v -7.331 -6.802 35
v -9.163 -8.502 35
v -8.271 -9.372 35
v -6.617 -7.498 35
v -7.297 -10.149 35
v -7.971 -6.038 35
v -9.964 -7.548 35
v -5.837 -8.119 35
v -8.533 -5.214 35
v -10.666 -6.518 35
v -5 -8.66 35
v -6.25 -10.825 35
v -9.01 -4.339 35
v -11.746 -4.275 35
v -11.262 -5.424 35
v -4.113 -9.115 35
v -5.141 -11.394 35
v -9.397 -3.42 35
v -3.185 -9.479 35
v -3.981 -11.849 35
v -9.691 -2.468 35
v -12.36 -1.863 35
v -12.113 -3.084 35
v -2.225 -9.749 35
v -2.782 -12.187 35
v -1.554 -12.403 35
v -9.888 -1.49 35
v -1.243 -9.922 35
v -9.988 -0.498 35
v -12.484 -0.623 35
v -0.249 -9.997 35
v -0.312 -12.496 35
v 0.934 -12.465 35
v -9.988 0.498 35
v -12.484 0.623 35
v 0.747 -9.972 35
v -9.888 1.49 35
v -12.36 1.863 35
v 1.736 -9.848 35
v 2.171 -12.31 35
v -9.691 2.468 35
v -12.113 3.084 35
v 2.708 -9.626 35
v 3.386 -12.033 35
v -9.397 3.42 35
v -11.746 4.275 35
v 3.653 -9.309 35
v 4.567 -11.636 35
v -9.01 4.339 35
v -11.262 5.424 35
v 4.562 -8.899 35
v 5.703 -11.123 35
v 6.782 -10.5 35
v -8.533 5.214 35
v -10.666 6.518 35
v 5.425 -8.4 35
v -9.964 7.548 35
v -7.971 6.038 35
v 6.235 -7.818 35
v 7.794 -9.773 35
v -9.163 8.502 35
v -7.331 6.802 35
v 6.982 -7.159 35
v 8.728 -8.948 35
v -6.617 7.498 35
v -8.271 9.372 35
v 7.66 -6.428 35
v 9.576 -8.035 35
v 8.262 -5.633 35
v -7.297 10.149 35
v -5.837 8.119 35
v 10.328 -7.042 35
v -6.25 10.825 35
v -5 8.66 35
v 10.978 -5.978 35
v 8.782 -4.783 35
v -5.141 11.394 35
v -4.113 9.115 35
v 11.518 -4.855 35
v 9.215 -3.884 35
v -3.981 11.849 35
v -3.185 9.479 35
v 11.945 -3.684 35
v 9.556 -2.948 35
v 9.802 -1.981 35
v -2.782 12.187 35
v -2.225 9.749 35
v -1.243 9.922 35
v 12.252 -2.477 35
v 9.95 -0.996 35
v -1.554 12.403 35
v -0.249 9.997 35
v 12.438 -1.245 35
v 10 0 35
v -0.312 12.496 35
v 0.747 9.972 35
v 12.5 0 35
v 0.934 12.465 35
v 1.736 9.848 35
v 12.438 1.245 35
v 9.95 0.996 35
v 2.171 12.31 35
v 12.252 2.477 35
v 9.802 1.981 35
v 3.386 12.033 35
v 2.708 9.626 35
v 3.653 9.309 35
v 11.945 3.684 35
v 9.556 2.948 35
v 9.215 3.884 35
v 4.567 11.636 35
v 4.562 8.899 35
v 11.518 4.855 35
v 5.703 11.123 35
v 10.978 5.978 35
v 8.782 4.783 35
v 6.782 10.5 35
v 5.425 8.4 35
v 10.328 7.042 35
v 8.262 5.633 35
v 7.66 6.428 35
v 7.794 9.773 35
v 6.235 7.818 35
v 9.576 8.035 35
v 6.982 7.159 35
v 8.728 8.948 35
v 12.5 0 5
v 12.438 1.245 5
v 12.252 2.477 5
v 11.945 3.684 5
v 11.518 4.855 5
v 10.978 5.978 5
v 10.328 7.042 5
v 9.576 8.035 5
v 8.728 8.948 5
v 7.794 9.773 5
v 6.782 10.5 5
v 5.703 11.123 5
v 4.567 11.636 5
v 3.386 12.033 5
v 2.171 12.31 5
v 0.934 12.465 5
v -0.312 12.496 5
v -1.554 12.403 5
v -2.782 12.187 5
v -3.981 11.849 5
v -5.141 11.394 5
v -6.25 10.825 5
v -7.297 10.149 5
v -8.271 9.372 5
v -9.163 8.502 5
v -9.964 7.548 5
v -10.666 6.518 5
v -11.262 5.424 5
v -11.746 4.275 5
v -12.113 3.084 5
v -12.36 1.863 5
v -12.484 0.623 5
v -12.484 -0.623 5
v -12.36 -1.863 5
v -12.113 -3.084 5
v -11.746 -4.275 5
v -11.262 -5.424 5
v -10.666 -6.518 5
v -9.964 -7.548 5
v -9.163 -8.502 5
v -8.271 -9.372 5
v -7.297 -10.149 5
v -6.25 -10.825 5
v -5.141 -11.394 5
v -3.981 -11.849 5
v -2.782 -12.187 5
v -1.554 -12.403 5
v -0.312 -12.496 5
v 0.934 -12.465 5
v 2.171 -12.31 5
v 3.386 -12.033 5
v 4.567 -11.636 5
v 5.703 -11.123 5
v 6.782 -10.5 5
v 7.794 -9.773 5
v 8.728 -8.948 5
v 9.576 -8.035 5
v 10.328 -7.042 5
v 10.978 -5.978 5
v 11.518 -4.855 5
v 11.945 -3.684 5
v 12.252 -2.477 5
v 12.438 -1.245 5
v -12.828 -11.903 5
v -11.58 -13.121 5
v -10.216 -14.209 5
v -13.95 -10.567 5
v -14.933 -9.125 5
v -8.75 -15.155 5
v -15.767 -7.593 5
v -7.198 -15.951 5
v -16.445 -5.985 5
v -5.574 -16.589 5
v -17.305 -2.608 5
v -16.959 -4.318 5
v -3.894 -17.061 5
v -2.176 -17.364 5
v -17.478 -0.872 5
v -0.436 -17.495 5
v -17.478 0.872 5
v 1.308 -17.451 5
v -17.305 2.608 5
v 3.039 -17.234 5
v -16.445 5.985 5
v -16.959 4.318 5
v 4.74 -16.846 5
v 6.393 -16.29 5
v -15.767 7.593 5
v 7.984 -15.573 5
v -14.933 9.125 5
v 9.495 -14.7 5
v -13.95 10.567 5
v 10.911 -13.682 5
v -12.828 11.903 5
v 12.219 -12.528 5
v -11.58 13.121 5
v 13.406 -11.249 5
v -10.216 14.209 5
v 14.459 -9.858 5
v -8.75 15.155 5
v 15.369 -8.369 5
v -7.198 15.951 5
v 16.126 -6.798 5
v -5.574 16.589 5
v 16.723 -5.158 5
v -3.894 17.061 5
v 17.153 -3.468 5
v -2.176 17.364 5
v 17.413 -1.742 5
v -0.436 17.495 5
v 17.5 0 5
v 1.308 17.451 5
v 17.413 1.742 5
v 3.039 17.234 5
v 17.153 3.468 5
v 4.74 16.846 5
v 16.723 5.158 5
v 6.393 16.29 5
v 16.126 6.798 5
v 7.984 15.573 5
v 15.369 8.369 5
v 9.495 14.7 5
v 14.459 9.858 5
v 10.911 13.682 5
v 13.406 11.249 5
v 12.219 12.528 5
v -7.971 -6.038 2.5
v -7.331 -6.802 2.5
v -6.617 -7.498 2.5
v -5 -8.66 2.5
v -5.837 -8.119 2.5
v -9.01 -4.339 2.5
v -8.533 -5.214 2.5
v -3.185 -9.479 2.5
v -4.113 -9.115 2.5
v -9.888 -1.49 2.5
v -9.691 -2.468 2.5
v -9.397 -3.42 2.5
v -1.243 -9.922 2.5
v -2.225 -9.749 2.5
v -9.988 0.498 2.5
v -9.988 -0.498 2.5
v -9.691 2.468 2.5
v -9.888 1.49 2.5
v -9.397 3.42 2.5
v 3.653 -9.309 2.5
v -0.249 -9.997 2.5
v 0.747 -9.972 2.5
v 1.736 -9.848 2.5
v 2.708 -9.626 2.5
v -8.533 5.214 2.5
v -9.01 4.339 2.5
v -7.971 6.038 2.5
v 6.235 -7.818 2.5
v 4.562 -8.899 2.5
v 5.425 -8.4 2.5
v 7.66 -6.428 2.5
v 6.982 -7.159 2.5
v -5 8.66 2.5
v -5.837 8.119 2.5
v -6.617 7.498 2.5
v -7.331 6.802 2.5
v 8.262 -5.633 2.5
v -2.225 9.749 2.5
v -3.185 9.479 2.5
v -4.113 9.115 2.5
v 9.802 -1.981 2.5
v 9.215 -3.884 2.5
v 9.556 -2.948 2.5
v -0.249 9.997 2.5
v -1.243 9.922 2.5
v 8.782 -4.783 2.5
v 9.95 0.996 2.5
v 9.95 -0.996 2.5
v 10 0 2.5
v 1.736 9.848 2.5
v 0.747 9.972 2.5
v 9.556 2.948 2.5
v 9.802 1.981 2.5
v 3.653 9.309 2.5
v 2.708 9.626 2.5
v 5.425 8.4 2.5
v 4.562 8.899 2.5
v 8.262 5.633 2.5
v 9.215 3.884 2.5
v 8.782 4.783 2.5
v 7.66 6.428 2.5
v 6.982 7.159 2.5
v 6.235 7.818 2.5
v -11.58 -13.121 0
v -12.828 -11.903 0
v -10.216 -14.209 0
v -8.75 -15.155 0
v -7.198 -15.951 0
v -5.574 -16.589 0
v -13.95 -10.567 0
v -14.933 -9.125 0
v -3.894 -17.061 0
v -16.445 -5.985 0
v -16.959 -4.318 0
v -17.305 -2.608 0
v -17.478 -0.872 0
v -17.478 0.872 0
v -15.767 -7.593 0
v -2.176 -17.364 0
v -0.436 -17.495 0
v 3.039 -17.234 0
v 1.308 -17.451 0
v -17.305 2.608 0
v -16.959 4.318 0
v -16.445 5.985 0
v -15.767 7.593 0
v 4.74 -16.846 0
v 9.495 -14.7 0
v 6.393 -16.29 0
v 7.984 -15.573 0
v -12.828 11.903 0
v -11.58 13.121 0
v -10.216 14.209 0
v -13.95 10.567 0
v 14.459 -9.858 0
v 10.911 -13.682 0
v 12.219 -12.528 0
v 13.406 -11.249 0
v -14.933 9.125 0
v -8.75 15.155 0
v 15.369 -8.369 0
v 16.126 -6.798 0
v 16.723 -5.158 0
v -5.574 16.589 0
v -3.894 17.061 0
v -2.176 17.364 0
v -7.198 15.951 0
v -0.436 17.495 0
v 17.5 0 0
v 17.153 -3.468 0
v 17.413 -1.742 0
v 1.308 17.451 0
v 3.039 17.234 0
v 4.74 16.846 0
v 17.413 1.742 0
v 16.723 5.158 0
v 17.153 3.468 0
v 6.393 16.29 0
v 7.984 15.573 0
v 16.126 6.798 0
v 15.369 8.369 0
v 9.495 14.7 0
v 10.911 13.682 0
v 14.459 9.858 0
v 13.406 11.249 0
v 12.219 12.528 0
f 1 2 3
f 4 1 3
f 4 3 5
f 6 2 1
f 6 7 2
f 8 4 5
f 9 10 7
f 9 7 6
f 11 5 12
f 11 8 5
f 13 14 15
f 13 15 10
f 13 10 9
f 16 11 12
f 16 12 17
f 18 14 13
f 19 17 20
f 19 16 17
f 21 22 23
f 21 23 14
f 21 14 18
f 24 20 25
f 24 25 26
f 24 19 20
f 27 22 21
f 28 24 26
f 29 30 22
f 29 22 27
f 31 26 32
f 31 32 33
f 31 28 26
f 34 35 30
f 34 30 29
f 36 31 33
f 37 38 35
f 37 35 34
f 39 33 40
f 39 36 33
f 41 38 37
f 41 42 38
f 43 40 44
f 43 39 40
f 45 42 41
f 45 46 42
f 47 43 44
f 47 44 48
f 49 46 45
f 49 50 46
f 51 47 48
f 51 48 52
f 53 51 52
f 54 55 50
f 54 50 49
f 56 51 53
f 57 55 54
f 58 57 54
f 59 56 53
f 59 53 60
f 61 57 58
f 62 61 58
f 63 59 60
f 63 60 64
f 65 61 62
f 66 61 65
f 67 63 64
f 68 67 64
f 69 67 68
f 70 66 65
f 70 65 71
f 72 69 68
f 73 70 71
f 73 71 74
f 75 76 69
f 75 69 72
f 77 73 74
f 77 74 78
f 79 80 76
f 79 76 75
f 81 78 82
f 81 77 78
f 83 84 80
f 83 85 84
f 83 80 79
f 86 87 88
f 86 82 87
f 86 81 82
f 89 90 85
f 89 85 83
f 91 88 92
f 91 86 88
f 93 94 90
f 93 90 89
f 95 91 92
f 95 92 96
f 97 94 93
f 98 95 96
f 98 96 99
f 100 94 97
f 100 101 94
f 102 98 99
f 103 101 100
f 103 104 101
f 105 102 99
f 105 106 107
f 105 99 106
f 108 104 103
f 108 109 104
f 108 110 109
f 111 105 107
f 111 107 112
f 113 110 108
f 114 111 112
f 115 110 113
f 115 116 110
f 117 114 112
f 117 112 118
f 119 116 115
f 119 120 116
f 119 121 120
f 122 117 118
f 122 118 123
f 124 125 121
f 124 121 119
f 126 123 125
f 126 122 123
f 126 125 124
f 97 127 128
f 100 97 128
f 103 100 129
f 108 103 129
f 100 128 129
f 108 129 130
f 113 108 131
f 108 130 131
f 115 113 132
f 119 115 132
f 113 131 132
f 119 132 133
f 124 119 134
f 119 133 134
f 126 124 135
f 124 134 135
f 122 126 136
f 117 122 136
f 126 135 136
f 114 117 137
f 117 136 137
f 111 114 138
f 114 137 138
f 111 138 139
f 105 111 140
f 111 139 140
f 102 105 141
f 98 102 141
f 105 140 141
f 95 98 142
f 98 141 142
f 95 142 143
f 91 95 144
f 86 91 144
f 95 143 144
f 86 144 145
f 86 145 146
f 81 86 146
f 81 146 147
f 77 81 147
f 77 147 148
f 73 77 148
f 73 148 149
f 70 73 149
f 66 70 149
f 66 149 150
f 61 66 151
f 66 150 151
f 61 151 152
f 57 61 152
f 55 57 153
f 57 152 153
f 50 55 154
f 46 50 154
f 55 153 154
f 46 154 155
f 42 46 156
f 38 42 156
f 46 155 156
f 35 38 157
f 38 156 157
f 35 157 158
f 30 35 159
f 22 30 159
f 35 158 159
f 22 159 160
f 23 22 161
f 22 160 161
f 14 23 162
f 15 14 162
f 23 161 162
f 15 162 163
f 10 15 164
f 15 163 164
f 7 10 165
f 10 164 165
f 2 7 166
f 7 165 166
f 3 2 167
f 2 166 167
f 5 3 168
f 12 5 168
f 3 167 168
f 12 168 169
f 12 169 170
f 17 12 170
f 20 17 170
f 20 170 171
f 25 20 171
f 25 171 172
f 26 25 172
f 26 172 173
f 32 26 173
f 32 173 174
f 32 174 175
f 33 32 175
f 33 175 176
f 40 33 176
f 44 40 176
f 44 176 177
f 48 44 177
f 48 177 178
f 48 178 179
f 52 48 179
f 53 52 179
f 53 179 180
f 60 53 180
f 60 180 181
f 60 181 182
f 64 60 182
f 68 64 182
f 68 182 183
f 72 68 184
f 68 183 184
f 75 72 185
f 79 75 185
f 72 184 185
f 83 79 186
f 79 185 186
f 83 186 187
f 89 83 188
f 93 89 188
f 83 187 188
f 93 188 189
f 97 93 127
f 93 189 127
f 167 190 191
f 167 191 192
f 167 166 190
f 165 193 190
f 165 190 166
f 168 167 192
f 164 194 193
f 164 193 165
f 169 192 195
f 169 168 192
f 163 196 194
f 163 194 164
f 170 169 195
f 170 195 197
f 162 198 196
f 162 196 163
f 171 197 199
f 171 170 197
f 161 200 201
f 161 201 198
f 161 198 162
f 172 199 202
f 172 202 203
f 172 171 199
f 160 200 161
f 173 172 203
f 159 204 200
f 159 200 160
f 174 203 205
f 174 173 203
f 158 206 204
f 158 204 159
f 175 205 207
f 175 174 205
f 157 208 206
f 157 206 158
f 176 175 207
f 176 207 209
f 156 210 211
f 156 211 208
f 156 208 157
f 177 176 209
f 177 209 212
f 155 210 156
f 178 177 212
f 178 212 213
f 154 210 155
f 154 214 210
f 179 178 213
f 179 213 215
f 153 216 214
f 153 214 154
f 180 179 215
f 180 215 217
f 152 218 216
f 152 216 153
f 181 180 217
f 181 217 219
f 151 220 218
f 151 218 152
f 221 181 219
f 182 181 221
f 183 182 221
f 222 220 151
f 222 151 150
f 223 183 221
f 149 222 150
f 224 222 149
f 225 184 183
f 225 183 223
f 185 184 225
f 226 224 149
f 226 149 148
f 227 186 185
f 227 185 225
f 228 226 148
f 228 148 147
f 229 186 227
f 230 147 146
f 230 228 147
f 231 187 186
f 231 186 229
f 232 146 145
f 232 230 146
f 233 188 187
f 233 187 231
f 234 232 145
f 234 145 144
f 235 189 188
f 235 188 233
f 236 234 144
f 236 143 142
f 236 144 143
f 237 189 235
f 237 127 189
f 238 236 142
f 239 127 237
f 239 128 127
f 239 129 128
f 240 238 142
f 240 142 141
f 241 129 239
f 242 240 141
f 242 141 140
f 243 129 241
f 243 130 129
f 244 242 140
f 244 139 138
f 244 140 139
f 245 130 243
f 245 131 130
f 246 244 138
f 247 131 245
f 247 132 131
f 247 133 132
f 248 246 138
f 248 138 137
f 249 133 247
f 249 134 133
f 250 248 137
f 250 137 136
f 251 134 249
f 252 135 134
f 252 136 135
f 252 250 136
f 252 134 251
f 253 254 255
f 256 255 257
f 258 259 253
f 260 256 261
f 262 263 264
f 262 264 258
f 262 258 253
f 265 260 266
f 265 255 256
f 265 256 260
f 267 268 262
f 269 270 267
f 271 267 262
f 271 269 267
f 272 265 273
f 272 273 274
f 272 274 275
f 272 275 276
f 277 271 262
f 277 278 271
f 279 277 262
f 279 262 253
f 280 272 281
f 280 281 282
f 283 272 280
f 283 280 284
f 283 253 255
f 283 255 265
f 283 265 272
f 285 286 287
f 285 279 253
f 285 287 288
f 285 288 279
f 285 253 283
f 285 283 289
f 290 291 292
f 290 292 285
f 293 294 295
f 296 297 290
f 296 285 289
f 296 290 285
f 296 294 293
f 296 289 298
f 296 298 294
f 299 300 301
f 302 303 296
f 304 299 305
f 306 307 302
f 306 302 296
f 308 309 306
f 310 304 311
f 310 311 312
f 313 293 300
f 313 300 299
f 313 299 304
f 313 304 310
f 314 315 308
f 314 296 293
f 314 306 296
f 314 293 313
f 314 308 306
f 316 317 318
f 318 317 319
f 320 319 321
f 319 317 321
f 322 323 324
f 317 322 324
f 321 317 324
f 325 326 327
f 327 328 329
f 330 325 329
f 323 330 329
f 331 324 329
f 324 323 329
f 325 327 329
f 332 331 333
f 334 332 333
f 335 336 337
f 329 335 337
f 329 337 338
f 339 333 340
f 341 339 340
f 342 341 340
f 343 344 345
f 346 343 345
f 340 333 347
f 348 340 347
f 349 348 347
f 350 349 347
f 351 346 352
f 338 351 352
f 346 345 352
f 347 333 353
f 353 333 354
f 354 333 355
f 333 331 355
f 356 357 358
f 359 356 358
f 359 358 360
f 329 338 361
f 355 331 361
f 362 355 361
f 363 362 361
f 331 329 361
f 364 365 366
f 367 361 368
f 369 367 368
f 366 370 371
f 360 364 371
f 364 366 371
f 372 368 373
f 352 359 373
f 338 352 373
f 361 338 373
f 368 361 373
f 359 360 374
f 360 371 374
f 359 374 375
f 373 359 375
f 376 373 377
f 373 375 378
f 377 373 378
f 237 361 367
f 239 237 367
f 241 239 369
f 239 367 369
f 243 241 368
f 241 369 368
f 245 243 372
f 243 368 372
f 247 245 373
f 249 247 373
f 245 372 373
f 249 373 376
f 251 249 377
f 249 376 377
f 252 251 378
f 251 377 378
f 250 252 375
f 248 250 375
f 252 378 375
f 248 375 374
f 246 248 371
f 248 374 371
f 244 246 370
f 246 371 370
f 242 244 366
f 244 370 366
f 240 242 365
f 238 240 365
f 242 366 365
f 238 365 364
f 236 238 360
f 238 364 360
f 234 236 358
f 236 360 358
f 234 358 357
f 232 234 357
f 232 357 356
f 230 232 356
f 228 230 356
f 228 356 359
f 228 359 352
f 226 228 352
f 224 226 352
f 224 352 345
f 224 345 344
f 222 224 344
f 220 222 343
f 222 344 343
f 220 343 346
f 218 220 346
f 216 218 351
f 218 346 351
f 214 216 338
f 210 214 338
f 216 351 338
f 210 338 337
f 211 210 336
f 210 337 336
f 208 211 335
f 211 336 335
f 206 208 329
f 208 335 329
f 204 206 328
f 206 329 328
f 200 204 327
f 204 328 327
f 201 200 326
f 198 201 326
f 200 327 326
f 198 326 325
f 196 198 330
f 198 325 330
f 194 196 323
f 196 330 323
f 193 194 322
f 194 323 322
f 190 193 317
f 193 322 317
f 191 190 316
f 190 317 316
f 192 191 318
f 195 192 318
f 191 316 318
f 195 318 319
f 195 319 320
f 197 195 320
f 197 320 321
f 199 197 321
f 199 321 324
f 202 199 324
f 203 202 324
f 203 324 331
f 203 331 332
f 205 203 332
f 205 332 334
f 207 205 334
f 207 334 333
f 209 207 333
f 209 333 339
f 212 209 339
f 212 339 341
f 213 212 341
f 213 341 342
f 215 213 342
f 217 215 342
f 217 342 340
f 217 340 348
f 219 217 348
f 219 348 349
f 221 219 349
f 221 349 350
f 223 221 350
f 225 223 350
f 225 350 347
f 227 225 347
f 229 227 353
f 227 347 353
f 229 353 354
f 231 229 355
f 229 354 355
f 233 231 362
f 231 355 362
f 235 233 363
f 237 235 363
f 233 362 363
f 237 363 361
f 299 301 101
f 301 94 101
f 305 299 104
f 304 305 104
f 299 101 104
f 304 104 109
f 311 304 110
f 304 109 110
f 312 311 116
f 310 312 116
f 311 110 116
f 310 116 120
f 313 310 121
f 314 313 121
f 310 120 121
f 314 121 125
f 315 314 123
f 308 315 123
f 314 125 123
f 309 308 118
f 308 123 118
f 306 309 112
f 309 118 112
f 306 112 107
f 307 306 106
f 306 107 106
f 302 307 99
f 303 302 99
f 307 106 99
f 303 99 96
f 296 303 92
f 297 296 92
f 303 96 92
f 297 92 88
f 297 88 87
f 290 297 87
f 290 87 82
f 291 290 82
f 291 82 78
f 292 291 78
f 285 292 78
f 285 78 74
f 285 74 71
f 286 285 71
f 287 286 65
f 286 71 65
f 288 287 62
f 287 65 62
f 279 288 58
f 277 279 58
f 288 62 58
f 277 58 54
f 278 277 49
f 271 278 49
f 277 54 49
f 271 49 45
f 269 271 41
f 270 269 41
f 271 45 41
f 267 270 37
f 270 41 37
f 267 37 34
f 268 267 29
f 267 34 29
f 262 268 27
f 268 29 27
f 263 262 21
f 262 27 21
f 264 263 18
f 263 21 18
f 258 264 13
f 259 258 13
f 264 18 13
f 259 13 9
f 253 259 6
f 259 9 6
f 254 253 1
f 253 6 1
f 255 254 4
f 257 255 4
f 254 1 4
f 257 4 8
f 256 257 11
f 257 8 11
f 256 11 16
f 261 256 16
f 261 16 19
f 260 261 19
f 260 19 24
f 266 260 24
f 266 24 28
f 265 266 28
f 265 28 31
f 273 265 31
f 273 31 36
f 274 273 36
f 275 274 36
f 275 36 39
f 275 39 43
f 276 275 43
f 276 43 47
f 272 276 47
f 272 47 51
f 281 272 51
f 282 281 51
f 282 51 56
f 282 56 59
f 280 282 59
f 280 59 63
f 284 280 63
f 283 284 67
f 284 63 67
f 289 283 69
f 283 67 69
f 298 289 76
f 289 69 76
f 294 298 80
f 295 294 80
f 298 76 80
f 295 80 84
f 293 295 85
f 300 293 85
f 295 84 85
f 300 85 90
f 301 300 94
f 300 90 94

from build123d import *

# Parameters (mm, degrees)
F0_R     = 17.5
F1_DEPTH = 5
F2_R     = 12.5
F3_DEPTH = 30
F4_T     = 2.5


# Not quite as in the source:
# - a shell that OpenCascade refuses in one call is made with other operations: the cavity is built on its own and cut out


with BuildPart() as f1:
    # F0 (on Top) → F1 (new body)
    with BuildSketch(Plane.XY):
        Circle(F0_R)
    extrude(amount=F1_DEPTH)

    # F2 (on face) → F3 (join)
    with BuildSketch(Plane.XY.offset(5)):
        Circle(F2_R)
    extrude(amount=F3_DEPTH)

    # F4: shell of thickness 2.5, made by hand


with BuildPart() as f4_core1:
    # F4_t2: copy of F1
    add(f1.part)

    # the walls: a layer under each face that stays
    f4_faces = [f4_core1.faces().sort_by_distance(p)[0] for p in [
        (-17.5, 0, 2.5),
        (0, 0, 0),
        (-11.6666666667, -11.6666666667, 5),
        (-12.5, 0, 20),
    ]]
    thicken(f4_faces, amount=-F4_T, mode=Mode.SUBTRACT)

    # F4_s3 → F4_t4 (revolve, cut)
    with BuildSketch(Plane.XZ):
        Polygon((12.525, 5.025), (12.5, 2.5), (10, 2.5), (10, 5), align=None)
    revolve(axis=Axis((0, 0, 5), (0, 0, 1)), mode=Mode.SUBTRACT)


with BuildPart() as f1_1:
    add(f1.part)

    # what is left inside the walls is the cavity
    f4_cavity = [f4_core1.part.solids().sort_by_distance(p)[0] for p in [
        (-9.975, 0, 13.333333),
    ]]
    add(f4_cavity, mode=Mode.SUBTRACT)


solid = f1_1.part
